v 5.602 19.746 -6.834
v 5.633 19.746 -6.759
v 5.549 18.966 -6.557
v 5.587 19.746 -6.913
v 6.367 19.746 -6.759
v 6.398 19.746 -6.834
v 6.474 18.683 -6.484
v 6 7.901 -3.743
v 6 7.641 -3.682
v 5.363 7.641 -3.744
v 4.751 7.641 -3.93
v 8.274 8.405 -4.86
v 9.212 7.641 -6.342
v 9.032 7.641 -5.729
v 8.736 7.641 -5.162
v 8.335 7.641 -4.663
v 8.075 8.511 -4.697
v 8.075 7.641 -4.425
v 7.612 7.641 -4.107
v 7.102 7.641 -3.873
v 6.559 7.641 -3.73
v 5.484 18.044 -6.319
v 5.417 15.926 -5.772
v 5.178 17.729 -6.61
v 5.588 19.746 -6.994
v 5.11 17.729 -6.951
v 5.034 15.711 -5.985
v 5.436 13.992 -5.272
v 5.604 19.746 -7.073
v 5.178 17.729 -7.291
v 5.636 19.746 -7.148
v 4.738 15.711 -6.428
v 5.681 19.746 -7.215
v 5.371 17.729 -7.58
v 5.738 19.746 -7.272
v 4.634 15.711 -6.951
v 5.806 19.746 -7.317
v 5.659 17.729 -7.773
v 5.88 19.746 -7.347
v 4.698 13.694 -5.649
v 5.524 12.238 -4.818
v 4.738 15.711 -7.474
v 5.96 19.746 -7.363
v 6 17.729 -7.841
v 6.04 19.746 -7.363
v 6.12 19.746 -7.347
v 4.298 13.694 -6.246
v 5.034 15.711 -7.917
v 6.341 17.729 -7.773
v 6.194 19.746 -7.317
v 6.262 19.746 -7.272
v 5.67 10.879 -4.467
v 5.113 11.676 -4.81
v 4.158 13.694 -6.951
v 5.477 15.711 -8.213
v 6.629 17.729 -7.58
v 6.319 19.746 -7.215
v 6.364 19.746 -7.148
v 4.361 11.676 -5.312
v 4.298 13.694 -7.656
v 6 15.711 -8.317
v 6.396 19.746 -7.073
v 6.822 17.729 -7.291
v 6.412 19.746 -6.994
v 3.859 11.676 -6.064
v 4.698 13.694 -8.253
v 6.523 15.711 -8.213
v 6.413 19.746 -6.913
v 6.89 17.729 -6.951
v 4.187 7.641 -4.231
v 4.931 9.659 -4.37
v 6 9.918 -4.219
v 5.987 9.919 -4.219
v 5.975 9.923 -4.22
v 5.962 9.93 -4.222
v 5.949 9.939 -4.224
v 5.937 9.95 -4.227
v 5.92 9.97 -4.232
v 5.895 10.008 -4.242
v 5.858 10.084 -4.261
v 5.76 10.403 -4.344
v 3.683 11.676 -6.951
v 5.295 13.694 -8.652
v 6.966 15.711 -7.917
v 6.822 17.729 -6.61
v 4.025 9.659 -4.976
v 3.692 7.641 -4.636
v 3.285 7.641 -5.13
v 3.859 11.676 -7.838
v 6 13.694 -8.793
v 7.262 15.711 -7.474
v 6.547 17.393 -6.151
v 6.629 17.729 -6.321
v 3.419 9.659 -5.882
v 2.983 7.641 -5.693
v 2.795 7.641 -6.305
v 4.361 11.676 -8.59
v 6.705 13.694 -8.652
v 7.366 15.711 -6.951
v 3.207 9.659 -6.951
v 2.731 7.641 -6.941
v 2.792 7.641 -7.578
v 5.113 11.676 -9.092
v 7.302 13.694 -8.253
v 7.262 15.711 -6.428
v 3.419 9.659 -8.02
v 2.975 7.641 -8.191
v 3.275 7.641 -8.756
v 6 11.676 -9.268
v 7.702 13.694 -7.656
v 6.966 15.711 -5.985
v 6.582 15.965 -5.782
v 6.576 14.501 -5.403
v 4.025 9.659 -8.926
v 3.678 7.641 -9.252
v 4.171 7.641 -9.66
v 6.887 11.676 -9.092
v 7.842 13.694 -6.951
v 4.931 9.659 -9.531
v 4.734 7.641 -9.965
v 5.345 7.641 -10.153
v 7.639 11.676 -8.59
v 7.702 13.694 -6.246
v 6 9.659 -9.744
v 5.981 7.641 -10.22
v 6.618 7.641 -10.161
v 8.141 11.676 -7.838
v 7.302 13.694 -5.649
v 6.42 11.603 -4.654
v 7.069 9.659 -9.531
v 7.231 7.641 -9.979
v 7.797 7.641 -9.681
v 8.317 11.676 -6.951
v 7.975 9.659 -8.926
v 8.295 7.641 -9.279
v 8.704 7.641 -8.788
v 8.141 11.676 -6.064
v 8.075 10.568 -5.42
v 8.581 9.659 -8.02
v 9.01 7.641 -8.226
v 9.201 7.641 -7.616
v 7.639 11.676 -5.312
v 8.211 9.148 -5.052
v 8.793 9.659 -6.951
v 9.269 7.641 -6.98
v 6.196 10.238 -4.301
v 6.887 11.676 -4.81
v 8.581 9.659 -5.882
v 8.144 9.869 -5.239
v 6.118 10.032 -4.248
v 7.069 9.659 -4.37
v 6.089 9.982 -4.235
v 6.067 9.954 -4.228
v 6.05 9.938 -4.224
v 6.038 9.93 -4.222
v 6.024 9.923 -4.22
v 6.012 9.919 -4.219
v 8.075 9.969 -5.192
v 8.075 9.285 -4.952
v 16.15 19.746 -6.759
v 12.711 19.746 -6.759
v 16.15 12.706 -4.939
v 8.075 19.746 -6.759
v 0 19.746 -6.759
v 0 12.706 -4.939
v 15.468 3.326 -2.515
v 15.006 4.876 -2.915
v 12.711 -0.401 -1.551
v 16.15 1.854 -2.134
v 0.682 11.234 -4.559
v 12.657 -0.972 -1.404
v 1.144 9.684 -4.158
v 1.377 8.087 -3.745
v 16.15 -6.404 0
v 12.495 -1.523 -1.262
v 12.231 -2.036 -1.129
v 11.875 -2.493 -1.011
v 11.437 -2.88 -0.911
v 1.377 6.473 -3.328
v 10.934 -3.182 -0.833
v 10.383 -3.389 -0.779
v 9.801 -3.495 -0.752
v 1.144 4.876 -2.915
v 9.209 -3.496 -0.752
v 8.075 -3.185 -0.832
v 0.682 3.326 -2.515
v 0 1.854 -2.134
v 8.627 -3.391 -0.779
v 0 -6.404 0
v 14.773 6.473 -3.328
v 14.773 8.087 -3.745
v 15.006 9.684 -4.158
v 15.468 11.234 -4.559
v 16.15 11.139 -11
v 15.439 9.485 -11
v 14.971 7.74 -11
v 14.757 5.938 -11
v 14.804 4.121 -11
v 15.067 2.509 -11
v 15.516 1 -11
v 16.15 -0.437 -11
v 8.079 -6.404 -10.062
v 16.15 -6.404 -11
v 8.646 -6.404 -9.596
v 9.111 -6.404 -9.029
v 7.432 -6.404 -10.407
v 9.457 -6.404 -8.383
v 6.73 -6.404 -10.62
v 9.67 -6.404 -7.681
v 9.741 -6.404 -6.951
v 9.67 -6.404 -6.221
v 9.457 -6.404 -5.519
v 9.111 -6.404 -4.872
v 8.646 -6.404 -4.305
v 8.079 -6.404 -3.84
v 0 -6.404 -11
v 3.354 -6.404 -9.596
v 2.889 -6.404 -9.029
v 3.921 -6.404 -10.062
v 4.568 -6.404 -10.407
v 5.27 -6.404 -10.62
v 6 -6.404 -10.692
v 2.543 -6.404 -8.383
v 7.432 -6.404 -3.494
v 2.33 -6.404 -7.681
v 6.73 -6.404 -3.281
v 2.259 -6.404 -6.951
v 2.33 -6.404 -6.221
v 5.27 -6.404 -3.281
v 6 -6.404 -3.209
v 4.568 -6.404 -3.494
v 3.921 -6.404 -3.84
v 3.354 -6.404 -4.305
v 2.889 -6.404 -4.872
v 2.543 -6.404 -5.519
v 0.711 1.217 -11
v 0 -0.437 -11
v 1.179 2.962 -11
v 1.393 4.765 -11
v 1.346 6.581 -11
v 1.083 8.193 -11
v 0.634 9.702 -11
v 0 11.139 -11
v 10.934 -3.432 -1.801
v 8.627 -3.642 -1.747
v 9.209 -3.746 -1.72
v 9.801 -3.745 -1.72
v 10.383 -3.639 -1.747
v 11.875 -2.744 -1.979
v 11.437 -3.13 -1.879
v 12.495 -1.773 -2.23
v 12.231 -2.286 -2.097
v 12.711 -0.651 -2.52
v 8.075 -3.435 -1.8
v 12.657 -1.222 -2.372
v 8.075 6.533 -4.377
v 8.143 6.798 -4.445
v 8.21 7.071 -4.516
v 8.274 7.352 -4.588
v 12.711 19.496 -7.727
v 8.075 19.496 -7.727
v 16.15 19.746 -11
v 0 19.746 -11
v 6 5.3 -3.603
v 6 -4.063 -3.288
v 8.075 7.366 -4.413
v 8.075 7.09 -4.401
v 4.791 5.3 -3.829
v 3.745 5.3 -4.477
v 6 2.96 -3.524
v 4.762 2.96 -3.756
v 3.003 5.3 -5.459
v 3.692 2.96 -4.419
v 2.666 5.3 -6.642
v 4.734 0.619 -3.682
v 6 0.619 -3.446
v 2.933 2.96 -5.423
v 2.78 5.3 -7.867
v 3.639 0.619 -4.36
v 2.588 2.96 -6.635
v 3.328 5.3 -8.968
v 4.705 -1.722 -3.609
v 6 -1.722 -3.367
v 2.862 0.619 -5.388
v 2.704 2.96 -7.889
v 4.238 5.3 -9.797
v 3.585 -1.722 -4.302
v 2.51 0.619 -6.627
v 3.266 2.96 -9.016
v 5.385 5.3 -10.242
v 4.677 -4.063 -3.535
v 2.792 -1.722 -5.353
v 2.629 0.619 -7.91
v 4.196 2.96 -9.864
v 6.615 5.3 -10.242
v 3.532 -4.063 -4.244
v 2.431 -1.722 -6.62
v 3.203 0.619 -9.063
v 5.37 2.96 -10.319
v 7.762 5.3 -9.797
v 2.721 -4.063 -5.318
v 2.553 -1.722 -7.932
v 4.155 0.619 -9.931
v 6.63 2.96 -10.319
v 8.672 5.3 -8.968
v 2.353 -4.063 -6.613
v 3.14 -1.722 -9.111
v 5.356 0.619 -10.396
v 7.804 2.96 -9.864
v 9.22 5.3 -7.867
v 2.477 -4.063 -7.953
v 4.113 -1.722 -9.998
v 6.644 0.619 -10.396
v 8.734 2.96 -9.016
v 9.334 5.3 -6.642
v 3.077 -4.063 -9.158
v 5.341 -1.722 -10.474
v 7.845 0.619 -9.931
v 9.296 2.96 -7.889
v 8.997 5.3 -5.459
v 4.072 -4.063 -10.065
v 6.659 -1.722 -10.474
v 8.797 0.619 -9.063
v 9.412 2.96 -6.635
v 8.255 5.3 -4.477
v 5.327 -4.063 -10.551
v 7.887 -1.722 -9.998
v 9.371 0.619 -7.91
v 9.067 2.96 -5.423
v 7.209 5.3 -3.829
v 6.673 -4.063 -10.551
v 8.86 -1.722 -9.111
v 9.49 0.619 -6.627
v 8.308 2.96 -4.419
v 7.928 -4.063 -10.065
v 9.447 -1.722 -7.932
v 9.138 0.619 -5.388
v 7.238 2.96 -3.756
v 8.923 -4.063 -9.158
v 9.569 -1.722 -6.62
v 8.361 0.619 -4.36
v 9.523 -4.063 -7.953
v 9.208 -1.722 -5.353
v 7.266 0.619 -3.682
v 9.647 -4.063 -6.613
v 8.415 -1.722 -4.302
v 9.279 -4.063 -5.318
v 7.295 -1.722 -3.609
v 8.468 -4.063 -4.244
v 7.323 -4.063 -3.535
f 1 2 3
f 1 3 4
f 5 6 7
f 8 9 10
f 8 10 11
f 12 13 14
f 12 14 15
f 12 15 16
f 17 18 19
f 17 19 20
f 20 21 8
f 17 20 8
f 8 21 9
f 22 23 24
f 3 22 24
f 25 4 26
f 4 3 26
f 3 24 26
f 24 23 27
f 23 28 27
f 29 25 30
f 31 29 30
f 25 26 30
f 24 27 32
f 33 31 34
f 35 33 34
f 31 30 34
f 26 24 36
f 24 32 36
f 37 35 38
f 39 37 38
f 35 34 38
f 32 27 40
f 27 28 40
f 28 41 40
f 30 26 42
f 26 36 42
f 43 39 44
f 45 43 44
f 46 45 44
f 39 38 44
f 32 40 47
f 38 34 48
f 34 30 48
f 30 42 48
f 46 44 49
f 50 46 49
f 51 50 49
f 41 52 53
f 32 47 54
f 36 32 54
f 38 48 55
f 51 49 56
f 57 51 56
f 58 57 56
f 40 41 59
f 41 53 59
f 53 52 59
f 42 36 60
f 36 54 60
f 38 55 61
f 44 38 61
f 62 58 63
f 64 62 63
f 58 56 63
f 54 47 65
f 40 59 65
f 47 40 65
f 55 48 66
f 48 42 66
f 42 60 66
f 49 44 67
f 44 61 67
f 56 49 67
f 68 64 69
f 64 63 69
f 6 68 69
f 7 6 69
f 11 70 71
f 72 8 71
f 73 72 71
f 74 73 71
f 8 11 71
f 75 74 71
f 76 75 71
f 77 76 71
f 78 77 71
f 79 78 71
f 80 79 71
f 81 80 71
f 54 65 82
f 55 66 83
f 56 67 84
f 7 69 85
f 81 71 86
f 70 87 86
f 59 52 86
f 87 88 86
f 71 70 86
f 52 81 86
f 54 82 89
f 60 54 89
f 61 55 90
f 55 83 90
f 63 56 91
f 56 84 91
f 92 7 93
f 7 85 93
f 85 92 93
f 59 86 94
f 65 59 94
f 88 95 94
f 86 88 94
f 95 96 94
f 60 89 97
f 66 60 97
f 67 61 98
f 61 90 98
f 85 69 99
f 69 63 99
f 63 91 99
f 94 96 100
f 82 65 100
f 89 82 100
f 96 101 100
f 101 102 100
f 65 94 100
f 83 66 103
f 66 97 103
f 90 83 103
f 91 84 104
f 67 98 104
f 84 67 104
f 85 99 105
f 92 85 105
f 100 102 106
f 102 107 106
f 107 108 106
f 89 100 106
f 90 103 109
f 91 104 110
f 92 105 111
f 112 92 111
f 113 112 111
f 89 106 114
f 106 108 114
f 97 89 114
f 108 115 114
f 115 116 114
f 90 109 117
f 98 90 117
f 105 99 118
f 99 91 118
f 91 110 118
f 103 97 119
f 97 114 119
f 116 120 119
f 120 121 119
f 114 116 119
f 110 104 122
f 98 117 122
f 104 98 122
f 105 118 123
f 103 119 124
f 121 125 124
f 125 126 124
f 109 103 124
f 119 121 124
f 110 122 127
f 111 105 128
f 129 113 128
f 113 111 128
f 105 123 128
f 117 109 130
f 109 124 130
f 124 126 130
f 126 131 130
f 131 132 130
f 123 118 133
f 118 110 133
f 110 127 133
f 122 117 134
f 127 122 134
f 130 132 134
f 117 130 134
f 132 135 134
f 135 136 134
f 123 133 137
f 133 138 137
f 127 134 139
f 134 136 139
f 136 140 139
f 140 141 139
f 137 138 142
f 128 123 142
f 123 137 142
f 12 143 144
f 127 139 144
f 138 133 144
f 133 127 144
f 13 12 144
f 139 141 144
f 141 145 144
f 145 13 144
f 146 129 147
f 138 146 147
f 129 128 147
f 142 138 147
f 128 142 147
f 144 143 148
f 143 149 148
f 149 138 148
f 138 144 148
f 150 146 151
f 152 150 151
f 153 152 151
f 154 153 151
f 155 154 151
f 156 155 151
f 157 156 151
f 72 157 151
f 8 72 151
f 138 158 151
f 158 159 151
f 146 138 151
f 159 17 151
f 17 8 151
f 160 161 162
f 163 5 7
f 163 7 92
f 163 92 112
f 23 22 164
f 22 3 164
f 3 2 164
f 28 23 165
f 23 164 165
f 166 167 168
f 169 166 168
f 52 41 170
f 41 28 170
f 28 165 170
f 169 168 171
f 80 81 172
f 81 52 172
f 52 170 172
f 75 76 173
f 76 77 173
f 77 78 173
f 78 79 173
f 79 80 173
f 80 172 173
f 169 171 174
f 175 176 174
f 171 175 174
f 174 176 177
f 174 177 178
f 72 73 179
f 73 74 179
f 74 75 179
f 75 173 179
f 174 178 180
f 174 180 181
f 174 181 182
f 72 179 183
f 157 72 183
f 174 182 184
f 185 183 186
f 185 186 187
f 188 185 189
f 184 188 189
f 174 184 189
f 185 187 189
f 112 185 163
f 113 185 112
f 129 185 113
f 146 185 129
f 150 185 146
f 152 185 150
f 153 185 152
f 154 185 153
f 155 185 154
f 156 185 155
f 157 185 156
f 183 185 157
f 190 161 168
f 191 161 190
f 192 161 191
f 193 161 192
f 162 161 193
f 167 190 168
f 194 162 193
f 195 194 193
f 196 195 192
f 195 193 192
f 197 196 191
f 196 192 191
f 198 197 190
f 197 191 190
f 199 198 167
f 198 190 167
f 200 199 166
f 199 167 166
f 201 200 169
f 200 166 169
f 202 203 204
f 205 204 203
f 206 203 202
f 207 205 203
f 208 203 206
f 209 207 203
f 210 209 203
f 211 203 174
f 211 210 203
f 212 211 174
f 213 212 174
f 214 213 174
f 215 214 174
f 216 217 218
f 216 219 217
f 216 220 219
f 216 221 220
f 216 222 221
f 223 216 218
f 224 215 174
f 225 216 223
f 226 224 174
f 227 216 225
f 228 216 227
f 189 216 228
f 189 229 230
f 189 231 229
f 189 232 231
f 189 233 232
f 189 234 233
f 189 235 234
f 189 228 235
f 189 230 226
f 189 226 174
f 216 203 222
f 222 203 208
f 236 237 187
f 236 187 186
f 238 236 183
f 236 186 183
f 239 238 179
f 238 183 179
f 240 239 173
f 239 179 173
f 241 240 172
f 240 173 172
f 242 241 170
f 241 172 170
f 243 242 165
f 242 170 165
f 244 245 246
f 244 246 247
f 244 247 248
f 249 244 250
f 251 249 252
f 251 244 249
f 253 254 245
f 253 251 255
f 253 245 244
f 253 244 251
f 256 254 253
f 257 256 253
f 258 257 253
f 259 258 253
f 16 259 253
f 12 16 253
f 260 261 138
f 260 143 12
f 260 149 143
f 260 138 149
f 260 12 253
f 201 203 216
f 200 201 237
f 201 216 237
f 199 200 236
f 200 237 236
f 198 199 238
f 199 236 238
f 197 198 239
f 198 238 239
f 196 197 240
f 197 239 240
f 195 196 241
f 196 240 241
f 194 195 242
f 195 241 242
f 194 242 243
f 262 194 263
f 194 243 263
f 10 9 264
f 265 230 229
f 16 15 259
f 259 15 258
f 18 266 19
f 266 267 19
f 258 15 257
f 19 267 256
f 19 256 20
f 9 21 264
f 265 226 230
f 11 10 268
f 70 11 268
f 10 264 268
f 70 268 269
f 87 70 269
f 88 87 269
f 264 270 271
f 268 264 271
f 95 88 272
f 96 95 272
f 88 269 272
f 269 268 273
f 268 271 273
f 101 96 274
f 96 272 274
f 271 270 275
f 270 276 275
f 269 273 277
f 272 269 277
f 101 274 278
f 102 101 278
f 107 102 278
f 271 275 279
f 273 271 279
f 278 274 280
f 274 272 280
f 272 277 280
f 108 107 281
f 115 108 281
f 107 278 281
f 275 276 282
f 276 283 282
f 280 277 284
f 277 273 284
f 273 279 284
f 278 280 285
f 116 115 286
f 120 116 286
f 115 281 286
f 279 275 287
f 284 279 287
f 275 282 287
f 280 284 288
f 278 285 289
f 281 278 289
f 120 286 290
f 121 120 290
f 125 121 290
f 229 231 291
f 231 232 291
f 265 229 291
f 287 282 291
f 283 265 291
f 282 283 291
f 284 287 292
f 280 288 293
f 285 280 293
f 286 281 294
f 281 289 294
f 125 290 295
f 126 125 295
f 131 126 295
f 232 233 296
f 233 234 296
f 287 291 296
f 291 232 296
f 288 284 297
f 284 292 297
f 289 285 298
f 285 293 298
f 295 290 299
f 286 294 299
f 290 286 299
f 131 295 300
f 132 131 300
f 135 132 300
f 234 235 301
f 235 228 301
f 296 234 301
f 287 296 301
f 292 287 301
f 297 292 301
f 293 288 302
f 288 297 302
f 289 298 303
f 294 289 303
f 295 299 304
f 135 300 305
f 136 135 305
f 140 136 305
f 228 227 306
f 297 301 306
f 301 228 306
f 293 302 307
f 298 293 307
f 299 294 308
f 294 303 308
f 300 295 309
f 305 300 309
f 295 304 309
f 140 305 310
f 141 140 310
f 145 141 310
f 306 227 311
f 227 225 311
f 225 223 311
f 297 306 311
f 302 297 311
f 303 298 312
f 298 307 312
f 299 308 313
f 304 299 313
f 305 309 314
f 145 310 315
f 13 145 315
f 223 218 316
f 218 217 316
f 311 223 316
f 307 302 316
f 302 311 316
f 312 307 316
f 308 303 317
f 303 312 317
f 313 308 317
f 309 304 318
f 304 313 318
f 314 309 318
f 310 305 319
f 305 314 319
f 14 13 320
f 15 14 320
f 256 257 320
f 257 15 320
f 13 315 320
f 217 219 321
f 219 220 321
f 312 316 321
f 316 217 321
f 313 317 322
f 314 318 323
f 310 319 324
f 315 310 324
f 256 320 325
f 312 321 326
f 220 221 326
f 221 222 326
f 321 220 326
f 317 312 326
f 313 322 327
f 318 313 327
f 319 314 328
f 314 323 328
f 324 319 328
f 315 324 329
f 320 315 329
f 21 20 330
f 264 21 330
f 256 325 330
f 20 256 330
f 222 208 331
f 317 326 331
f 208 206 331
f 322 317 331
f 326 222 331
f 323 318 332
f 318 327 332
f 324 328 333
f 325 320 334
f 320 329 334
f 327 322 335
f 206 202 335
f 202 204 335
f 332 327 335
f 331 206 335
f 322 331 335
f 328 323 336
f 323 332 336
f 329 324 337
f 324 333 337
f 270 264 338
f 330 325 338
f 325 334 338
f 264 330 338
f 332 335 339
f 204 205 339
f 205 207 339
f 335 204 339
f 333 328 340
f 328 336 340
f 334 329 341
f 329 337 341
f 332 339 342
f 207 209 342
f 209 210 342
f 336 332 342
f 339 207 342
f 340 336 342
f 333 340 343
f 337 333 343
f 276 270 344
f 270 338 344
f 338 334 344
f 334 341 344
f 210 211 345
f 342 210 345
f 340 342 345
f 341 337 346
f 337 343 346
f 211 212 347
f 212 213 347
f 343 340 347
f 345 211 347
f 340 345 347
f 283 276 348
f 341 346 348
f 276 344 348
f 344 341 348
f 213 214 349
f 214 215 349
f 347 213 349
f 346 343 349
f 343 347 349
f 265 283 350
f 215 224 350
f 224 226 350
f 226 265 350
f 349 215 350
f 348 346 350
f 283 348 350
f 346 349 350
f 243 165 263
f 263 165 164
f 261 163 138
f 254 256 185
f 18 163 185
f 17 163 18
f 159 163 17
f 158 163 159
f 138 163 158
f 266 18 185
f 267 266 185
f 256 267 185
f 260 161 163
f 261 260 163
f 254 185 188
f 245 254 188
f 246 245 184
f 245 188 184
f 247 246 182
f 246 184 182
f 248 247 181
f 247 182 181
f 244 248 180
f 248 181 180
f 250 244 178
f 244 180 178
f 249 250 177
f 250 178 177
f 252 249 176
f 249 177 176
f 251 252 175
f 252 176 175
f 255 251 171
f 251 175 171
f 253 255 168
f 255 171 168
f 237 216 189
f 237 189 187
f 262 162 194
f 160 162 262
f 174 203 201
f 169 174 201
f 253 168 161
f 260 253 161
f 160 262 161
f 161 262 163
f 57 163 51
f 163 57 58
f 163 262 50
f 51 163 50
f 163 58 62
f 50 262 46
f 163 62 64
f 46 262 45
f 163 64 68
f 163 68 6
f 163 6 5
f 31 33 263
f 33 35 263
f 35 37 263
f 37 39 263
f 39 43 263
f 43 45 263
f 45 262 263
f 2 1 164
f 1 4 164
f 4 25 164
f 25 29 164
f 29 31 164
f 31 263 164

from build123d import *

# Parameters (mm, degrees)
F0_W      = 26.15
F0_H      = 11
F1_DEPTH  = 16.15
F3_DEPTH  = 25
F5_DEPTH  = 1
F13_DEPTH = 10


# Not quite as in the source:
# - the program builds the solid bodies; features that only make, move or delete a surface that nothing else refers to are left out


with BuildPart() as f1:
    # F0 (on Right) → F1 (new body)
    with BuildSketch(Plane.YZ):
        with Locations((6.6714687273, -5.5)):
            Rectangle(F0_W, F0_H)
    extrude(amount=F1_DEPTH)

    # F2 (on face) → F3 (cut)
    with BuildSketch(Plane(origin=(0, 0, 0), x_dir=(0, -1, 0), z_dir=(-1, 0, 0))):
        Polygon((-19.7464687273, -6.7590326071), (6.4035312727, 0), (-19.7464687273, 0), align=None)
    extrude(amount=-F3_DEPTH, mode=Mode.SUBTRACT)

    # F4 (on face) → F5 (cut)
    with BuildSketch(Plane(origin=(0, -0.4010136369, -1.5514803987), x_dir=(1, 0, 0), z_dir=(0, 0.2502475322, 0.9681818903))):
        with BuildLine():
            Line((12.7111524343, 0), (12.7111524343, 20.8096046483))
            Line((12.7111524343, 20.8096046483), (8.075, 20.8096046483))
            Line((8.075, 20.8096046483), (8.075, -2.8755263988))
            ThreePointArc((8.075, -2.8755263988), (11.1931797197, -2.7277537217), (12.7111524343, 0))
        make_face()
    extrude(amount=-F5_DEPTH, mode=Mode.SUBTRACT)

    # F9 (on offset) → F10 (revolve, cut)
    with BuildSketch(Plane.YZ.offset(6)):
        Polygon((7.6412414201, -3.6817420176), (-6.7182444036, -3.1987416248), (-6.7182444036, -6.9507951848), (7.6412414201, -6.9507951848), align=None)
        Polygon((19.8289547116, -6.5558860078), (7.6412414201, -3.6817420176), (7.6412414201, -6.9507951848), (19.8289547116, -6.9507951848), align=None)
    revolve(axis=Axis((6, 0.4614985082, -6.9507951848), (0, -1, 0)), mode=Mode.SUBTRACT)

    # F9 (on offset) → F11 (revolve, cut)
    with BuildSketch(Plane.YZ.offset(6)):
        Polygon((19.8289547116, -6.5558860078), (7.6412414201, -3.6817420176), (7.6412414201, -6.9507951848), (19.8289547116, -6.9507951848), align=None)
    revolve(axis=Axis((6, 13.7350980658, -6.9507951848), (0, 1, 0)), mode=Mode.SUBTRACT)

    # F12 (on face) → F13 (cut)
    with BuildSketch(Plane(origin=(0, -0.4010136369, -1.5514803987), x_dir=(1, 0, 0), z_dir=(0, 0.2502475322, 0.9681818903))):
        with BuildLine():
            Line((0, 13.5377381568), (0, 2.3293004092))
            ThreePointArc((0, 2.3293004092), (1.4062806348, 7.933519283), (0, 13.5377381568))
        make_face()
        with BuildLine():
            Line((16.15, 2.3293004092), (16.15, 13.5377381568))
            ThreePointArc((16.15, 13.5377381568), (14.7437193652, 7.933519283), (16.15, 2.3293004092))
        make_face()
    extrude(amount=-F13_DEPTH, mode=Mode.SUBTRACT)


solid = f1.part
